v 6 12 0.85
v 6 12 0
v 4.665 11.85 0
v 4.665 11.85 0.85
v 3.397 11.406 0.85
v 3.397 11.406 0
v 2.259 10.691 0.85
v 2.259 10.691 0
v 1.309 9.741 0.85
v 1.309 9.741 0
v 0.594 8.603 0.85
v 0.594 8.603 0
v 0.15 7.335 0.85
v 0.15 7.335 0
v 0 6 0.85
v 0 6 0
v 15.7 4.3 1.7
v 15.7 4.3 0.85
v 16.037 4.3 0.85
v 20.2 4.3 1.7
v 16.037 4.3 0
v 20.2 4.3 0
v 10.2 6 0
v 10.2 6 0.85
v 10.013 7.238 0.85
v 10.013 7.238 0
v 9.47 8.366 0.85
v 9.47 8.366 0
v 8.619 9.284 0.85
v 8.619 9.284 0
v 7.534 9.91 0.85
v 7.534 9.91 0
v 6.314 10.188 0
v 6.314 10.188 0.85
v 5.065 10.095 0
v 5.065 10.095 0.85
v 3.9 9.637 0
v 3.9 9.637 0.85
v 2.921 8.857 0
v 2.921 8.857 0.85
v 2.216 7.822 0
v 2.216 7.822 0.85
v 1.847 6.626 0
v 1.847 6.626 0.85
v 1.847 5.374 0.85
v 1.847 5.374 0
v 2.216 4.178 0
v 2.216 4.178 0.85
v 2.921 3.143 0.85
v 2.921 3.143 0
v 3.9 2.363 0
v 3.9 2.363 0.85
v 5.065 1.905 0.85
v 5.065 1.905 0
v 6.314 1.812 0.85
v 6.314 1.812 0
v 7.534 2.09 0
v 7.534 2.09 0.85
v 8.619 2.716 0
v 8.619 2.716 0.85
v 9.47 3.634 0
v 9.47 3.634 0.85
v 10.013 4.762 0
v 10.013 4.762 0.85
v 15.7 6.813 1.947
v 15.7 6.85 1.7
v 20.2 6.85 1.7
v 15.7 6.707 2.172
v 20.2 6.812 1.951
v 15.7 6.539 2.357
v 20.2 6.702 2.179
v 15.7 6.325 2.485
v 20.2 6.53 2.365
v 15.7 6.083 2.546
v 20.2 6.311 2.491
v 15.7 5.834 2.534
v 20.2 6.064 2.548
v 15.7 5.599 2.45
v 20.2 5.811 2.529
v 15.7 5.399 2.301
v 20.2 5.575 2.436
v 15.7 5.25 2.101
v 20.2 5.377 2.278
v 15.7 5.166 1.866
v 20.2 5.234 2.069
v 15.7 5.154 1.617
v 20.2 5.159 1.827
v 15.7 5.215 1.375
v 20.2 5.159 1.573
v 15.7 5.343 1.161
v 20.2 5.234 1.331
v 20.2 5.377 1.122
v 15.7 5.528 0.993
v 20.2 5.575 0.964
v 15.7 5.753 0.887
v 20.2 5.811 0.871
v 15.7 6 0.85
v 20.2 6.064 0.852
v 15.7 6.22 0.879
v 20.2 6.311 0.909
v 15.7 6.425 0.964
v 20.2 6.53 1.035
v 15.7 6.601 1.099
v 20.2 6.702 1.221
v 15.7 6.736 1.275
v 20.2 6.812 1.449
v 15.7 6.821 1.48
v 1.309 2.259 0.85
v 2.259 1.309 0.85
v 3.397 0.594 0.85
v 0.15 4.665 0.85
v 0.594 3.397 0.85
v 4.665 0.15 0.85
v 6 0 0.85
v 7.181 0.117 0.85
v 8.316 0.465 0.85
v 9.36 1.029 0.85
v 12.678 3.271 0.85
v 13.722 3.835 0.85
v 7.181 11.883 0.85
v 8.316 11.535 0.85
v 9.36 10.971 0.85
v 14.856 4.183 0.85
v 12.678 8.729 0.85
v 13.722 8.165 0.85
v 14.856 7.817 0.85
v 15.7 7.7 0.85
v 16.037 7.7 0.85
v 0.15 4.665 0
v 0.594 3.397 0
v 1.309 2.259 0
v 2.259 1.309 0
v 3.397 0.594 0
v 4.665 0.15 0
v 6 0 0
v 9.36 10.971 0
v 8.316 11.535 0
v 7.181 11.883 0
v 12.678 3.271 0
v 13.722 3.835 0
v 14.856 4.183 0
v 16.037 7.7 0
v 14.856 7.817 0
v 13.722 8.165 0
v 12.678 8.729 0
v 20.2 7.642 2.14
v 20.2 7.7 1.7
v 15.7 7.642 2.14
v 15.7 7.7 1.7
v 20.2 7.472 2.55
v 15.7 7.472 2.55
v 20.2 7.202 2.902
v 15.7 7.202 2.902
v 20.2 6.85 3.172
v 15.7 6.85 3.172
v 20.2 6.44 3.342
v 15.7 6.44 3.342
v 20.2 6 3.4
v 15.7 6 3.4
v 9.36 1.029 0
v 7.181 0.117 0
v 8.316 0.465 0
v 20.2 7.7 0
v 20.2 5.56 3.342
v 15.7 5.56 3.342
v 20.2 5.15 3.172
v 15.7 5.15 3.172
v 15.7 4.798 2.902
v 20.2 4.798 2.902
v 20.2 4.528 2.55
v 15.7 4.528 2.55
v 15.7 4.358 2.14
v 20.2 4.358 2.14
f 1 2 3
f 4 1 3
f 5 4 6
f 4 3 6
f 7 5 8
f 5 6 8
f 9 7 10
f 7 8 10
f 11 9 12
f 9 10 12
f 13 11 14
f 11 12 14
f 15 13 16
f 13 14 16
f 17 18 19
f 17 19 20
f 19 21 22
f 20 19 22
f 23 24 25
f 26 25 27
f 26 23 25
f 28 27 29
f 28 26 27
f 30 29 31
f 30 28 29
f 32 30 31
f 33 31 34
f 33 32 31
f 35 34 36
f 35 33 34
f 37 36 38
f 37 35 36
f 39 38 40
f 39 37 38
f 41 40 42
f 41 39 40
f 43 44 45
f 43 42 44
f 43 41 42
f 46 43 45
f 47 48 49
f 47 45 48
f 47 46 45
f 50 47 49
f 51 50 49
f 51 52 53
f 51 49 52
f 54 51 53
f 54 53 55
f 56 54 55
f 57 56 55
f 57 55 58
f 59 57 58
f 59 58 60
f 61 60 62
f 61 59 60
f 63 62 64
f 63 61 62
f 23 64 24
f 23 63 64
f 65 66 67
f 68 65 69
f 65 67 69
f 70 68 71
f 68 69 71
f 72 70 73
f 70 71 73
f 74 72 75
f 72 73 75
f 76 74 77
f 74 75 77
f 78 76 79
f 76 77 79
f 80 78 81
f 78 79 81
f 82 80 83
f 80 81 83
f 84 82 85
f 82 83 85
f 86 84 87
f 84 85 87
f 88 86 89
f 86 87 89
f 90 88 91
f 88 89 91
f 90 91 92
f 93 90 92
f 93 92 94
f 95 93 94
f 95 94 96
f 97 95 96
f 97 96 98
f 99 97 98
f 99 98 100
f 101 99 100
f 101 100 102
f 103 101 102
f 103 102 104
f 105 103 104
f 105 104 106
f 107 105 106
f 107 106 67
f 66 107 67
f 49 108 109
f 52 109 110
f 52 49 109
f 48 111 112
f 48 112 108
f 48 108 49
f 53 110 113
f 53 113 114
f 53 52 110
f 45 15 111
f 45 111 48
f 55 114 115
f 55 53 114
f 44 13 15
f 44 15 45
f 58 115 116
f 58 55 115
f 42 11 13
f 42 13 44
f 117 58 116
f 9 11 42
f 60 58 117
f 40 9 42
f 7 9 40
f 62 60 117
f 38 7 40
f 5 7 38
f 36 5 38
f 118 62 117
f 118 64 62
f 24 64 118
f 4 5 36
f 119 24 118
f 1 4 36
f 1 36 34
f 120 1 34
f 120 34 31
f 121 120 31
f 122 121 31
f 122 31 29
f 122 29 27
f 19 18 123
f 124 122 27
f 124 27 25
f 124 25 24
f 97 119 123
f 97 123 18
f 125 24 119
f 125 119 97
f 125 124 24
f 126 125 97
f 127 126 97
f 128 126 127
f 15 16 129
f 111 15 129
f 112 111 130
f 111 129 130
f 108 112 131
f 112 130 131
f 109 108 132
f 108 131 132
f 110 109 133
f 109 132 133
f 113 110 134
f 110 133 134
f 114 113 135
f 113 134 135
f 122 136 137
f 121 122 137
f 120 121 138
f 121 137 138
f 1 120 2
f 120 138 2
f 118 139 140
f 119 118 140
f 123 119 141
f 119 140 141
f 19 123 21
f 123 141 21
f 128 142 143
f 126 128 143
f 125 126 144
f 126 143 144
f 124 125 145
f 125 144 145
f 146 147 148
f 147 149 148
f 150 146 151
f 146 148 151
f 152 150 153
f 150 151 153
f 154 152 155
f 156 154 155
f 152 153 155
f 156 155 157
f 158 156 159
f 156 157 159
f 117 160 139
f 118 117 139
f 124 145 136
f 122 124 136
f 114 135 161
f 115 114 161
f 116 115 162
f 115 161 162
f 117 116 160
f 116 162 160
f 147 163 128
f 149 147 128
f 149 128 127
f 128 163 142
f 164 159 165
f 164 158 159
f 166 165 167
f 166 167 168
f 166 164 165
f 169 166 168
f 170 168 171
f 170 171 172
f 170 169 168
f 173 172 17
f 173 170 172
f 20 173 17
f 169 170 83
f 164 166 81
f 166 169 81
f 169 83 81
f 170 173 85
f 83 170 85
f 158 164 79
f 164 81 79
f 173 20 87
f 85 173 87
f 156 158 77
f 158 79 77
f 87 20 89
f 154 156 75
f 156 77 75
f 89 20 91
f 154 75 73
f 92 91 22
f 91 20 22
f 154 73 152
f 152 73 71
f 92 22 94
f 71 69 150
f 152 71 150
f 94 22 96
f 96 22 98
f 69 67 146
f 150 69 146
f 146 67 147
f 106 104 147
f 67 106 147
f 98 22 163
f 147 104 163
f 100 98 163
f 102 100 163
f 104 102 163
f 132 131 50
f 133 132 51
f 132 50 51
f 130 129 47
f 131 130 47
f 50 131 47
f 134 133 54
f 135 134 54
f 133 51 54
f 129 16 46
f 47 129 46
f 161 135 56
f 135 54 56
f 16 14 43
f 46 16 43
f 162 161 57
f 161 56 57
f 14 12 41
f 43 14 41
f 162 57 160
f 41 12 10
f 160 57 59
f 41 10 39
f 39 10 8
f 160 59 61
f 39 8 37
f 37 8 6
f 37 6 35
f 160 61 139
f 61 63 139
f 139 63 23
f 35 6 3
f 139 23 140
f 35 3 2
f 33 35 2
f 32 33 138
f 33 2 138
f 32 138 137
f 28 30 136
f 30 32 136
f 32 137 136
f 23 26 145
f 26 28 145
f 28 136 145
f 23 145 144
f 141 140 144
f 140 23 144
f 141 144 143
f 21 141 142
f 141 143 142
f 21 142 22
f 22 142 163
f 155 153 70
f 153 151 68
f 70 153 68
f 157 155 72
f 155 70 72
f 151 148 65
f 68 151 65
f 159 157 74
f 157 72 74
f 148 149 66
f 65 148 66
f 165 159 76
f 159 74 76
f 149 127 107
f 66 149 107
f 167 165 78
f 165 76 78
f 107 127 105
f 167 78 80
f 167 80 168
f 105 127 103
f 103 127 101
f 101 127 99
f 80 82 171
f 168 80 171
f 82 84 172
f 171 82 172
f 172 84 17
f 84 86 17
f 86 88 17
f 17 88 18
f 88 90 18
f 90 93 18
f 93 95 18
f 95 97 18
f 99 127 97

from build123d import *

# Parameters (mm, degrees)
F0_R     = 4.2
F1_DEPTH = 0.85
F3_DEPTH = 2.55
F4_R     = 1.69999
F5_R     = 0.85
F6_DEPTH = 25


# Not quite as in the source:
# - a fillet or chamfer is up to 0.001 mm smaller than in the source, because OpenCascade refuses the exact size


with BuildPart() as f1:
    # F0 (on Top) → F1 (new body)
    with BuildSketch(Plane.XY):
        with BuildLine():
            Line((16.0373335058, 4.3), (20.2, 4.3))
            Line((20.2, 4.3), (20.2, 7.7))
            Line((20.2, 7.7), (16.0373335058, 7.7))
            ThreePointArc((16.0373335058, 7.7), (14.2805243712, 7.9629605488), (12.6777057346, 8.7287927785))
            Line((12.6777057346, 8.7287927785), (9.3596277711, 10.9712072215))
            ThreePointArc((9.3596277711, 10.9712072215), (7.7568091346, 11.7370394512), (6, 12))
            ThreePointArc((6, 12), (1.7573593129, 10.2426406871), (0, 6))
            ThreePointArc((0, 6), (1.7573593129, 1.7573593129), (6, 0))
            ThreePointArc((6, 0), (7.7568091346, 0.2629605488), (9.3596277711, 1.0287927785))
            Line((9.3596277711, 1.0287927785), (12.6777057346, 3.2712072215))
            ThreePointArc((12.6777057346, 3.2712072215), (14.2805243712, 4.0370394512), (16.0373335058, 4.3))
        make_face()
        with Locations((6, 6)):
            Circle(F0_R, mode=Mode.SUBTRACT)
    extrude(amount=F1_DEPTH)

    # F2 (on face) → F3 (join)
    with BuildSketch(Plane.XY.offset(0.85)):
        Polygon((20.2, 4.3), (20.2, 7.7), (16.0373335058, 7.7), (15.7, 7.7), (15.7, 4.3), (16.0373335058, 4.3), align=None)
    extrude(amount=F3_DEPTH)

    # F4 (radius 1.7 in the source; OpenCascade refuses exactly that, so slightly less here)
    f4_edges = [f1.edges().sort_by_distance(p)[0] for p in [
        (17.95, 7.7, 3.4),
        (17.95, 4.3, 3.4),
    ]]
    fillet(f4_edges, radius=F4_R)

    # F5 (on face) → F6 (cut)
    with BuildSketch(Plane.YZ.offset(20.2)):
        with Locations((6, 1.7)):
            Circle(F5_R)
    extrude(amount=-F6_DEPTH, mode=Mode.SUBTRACT)


solid = f1.part
